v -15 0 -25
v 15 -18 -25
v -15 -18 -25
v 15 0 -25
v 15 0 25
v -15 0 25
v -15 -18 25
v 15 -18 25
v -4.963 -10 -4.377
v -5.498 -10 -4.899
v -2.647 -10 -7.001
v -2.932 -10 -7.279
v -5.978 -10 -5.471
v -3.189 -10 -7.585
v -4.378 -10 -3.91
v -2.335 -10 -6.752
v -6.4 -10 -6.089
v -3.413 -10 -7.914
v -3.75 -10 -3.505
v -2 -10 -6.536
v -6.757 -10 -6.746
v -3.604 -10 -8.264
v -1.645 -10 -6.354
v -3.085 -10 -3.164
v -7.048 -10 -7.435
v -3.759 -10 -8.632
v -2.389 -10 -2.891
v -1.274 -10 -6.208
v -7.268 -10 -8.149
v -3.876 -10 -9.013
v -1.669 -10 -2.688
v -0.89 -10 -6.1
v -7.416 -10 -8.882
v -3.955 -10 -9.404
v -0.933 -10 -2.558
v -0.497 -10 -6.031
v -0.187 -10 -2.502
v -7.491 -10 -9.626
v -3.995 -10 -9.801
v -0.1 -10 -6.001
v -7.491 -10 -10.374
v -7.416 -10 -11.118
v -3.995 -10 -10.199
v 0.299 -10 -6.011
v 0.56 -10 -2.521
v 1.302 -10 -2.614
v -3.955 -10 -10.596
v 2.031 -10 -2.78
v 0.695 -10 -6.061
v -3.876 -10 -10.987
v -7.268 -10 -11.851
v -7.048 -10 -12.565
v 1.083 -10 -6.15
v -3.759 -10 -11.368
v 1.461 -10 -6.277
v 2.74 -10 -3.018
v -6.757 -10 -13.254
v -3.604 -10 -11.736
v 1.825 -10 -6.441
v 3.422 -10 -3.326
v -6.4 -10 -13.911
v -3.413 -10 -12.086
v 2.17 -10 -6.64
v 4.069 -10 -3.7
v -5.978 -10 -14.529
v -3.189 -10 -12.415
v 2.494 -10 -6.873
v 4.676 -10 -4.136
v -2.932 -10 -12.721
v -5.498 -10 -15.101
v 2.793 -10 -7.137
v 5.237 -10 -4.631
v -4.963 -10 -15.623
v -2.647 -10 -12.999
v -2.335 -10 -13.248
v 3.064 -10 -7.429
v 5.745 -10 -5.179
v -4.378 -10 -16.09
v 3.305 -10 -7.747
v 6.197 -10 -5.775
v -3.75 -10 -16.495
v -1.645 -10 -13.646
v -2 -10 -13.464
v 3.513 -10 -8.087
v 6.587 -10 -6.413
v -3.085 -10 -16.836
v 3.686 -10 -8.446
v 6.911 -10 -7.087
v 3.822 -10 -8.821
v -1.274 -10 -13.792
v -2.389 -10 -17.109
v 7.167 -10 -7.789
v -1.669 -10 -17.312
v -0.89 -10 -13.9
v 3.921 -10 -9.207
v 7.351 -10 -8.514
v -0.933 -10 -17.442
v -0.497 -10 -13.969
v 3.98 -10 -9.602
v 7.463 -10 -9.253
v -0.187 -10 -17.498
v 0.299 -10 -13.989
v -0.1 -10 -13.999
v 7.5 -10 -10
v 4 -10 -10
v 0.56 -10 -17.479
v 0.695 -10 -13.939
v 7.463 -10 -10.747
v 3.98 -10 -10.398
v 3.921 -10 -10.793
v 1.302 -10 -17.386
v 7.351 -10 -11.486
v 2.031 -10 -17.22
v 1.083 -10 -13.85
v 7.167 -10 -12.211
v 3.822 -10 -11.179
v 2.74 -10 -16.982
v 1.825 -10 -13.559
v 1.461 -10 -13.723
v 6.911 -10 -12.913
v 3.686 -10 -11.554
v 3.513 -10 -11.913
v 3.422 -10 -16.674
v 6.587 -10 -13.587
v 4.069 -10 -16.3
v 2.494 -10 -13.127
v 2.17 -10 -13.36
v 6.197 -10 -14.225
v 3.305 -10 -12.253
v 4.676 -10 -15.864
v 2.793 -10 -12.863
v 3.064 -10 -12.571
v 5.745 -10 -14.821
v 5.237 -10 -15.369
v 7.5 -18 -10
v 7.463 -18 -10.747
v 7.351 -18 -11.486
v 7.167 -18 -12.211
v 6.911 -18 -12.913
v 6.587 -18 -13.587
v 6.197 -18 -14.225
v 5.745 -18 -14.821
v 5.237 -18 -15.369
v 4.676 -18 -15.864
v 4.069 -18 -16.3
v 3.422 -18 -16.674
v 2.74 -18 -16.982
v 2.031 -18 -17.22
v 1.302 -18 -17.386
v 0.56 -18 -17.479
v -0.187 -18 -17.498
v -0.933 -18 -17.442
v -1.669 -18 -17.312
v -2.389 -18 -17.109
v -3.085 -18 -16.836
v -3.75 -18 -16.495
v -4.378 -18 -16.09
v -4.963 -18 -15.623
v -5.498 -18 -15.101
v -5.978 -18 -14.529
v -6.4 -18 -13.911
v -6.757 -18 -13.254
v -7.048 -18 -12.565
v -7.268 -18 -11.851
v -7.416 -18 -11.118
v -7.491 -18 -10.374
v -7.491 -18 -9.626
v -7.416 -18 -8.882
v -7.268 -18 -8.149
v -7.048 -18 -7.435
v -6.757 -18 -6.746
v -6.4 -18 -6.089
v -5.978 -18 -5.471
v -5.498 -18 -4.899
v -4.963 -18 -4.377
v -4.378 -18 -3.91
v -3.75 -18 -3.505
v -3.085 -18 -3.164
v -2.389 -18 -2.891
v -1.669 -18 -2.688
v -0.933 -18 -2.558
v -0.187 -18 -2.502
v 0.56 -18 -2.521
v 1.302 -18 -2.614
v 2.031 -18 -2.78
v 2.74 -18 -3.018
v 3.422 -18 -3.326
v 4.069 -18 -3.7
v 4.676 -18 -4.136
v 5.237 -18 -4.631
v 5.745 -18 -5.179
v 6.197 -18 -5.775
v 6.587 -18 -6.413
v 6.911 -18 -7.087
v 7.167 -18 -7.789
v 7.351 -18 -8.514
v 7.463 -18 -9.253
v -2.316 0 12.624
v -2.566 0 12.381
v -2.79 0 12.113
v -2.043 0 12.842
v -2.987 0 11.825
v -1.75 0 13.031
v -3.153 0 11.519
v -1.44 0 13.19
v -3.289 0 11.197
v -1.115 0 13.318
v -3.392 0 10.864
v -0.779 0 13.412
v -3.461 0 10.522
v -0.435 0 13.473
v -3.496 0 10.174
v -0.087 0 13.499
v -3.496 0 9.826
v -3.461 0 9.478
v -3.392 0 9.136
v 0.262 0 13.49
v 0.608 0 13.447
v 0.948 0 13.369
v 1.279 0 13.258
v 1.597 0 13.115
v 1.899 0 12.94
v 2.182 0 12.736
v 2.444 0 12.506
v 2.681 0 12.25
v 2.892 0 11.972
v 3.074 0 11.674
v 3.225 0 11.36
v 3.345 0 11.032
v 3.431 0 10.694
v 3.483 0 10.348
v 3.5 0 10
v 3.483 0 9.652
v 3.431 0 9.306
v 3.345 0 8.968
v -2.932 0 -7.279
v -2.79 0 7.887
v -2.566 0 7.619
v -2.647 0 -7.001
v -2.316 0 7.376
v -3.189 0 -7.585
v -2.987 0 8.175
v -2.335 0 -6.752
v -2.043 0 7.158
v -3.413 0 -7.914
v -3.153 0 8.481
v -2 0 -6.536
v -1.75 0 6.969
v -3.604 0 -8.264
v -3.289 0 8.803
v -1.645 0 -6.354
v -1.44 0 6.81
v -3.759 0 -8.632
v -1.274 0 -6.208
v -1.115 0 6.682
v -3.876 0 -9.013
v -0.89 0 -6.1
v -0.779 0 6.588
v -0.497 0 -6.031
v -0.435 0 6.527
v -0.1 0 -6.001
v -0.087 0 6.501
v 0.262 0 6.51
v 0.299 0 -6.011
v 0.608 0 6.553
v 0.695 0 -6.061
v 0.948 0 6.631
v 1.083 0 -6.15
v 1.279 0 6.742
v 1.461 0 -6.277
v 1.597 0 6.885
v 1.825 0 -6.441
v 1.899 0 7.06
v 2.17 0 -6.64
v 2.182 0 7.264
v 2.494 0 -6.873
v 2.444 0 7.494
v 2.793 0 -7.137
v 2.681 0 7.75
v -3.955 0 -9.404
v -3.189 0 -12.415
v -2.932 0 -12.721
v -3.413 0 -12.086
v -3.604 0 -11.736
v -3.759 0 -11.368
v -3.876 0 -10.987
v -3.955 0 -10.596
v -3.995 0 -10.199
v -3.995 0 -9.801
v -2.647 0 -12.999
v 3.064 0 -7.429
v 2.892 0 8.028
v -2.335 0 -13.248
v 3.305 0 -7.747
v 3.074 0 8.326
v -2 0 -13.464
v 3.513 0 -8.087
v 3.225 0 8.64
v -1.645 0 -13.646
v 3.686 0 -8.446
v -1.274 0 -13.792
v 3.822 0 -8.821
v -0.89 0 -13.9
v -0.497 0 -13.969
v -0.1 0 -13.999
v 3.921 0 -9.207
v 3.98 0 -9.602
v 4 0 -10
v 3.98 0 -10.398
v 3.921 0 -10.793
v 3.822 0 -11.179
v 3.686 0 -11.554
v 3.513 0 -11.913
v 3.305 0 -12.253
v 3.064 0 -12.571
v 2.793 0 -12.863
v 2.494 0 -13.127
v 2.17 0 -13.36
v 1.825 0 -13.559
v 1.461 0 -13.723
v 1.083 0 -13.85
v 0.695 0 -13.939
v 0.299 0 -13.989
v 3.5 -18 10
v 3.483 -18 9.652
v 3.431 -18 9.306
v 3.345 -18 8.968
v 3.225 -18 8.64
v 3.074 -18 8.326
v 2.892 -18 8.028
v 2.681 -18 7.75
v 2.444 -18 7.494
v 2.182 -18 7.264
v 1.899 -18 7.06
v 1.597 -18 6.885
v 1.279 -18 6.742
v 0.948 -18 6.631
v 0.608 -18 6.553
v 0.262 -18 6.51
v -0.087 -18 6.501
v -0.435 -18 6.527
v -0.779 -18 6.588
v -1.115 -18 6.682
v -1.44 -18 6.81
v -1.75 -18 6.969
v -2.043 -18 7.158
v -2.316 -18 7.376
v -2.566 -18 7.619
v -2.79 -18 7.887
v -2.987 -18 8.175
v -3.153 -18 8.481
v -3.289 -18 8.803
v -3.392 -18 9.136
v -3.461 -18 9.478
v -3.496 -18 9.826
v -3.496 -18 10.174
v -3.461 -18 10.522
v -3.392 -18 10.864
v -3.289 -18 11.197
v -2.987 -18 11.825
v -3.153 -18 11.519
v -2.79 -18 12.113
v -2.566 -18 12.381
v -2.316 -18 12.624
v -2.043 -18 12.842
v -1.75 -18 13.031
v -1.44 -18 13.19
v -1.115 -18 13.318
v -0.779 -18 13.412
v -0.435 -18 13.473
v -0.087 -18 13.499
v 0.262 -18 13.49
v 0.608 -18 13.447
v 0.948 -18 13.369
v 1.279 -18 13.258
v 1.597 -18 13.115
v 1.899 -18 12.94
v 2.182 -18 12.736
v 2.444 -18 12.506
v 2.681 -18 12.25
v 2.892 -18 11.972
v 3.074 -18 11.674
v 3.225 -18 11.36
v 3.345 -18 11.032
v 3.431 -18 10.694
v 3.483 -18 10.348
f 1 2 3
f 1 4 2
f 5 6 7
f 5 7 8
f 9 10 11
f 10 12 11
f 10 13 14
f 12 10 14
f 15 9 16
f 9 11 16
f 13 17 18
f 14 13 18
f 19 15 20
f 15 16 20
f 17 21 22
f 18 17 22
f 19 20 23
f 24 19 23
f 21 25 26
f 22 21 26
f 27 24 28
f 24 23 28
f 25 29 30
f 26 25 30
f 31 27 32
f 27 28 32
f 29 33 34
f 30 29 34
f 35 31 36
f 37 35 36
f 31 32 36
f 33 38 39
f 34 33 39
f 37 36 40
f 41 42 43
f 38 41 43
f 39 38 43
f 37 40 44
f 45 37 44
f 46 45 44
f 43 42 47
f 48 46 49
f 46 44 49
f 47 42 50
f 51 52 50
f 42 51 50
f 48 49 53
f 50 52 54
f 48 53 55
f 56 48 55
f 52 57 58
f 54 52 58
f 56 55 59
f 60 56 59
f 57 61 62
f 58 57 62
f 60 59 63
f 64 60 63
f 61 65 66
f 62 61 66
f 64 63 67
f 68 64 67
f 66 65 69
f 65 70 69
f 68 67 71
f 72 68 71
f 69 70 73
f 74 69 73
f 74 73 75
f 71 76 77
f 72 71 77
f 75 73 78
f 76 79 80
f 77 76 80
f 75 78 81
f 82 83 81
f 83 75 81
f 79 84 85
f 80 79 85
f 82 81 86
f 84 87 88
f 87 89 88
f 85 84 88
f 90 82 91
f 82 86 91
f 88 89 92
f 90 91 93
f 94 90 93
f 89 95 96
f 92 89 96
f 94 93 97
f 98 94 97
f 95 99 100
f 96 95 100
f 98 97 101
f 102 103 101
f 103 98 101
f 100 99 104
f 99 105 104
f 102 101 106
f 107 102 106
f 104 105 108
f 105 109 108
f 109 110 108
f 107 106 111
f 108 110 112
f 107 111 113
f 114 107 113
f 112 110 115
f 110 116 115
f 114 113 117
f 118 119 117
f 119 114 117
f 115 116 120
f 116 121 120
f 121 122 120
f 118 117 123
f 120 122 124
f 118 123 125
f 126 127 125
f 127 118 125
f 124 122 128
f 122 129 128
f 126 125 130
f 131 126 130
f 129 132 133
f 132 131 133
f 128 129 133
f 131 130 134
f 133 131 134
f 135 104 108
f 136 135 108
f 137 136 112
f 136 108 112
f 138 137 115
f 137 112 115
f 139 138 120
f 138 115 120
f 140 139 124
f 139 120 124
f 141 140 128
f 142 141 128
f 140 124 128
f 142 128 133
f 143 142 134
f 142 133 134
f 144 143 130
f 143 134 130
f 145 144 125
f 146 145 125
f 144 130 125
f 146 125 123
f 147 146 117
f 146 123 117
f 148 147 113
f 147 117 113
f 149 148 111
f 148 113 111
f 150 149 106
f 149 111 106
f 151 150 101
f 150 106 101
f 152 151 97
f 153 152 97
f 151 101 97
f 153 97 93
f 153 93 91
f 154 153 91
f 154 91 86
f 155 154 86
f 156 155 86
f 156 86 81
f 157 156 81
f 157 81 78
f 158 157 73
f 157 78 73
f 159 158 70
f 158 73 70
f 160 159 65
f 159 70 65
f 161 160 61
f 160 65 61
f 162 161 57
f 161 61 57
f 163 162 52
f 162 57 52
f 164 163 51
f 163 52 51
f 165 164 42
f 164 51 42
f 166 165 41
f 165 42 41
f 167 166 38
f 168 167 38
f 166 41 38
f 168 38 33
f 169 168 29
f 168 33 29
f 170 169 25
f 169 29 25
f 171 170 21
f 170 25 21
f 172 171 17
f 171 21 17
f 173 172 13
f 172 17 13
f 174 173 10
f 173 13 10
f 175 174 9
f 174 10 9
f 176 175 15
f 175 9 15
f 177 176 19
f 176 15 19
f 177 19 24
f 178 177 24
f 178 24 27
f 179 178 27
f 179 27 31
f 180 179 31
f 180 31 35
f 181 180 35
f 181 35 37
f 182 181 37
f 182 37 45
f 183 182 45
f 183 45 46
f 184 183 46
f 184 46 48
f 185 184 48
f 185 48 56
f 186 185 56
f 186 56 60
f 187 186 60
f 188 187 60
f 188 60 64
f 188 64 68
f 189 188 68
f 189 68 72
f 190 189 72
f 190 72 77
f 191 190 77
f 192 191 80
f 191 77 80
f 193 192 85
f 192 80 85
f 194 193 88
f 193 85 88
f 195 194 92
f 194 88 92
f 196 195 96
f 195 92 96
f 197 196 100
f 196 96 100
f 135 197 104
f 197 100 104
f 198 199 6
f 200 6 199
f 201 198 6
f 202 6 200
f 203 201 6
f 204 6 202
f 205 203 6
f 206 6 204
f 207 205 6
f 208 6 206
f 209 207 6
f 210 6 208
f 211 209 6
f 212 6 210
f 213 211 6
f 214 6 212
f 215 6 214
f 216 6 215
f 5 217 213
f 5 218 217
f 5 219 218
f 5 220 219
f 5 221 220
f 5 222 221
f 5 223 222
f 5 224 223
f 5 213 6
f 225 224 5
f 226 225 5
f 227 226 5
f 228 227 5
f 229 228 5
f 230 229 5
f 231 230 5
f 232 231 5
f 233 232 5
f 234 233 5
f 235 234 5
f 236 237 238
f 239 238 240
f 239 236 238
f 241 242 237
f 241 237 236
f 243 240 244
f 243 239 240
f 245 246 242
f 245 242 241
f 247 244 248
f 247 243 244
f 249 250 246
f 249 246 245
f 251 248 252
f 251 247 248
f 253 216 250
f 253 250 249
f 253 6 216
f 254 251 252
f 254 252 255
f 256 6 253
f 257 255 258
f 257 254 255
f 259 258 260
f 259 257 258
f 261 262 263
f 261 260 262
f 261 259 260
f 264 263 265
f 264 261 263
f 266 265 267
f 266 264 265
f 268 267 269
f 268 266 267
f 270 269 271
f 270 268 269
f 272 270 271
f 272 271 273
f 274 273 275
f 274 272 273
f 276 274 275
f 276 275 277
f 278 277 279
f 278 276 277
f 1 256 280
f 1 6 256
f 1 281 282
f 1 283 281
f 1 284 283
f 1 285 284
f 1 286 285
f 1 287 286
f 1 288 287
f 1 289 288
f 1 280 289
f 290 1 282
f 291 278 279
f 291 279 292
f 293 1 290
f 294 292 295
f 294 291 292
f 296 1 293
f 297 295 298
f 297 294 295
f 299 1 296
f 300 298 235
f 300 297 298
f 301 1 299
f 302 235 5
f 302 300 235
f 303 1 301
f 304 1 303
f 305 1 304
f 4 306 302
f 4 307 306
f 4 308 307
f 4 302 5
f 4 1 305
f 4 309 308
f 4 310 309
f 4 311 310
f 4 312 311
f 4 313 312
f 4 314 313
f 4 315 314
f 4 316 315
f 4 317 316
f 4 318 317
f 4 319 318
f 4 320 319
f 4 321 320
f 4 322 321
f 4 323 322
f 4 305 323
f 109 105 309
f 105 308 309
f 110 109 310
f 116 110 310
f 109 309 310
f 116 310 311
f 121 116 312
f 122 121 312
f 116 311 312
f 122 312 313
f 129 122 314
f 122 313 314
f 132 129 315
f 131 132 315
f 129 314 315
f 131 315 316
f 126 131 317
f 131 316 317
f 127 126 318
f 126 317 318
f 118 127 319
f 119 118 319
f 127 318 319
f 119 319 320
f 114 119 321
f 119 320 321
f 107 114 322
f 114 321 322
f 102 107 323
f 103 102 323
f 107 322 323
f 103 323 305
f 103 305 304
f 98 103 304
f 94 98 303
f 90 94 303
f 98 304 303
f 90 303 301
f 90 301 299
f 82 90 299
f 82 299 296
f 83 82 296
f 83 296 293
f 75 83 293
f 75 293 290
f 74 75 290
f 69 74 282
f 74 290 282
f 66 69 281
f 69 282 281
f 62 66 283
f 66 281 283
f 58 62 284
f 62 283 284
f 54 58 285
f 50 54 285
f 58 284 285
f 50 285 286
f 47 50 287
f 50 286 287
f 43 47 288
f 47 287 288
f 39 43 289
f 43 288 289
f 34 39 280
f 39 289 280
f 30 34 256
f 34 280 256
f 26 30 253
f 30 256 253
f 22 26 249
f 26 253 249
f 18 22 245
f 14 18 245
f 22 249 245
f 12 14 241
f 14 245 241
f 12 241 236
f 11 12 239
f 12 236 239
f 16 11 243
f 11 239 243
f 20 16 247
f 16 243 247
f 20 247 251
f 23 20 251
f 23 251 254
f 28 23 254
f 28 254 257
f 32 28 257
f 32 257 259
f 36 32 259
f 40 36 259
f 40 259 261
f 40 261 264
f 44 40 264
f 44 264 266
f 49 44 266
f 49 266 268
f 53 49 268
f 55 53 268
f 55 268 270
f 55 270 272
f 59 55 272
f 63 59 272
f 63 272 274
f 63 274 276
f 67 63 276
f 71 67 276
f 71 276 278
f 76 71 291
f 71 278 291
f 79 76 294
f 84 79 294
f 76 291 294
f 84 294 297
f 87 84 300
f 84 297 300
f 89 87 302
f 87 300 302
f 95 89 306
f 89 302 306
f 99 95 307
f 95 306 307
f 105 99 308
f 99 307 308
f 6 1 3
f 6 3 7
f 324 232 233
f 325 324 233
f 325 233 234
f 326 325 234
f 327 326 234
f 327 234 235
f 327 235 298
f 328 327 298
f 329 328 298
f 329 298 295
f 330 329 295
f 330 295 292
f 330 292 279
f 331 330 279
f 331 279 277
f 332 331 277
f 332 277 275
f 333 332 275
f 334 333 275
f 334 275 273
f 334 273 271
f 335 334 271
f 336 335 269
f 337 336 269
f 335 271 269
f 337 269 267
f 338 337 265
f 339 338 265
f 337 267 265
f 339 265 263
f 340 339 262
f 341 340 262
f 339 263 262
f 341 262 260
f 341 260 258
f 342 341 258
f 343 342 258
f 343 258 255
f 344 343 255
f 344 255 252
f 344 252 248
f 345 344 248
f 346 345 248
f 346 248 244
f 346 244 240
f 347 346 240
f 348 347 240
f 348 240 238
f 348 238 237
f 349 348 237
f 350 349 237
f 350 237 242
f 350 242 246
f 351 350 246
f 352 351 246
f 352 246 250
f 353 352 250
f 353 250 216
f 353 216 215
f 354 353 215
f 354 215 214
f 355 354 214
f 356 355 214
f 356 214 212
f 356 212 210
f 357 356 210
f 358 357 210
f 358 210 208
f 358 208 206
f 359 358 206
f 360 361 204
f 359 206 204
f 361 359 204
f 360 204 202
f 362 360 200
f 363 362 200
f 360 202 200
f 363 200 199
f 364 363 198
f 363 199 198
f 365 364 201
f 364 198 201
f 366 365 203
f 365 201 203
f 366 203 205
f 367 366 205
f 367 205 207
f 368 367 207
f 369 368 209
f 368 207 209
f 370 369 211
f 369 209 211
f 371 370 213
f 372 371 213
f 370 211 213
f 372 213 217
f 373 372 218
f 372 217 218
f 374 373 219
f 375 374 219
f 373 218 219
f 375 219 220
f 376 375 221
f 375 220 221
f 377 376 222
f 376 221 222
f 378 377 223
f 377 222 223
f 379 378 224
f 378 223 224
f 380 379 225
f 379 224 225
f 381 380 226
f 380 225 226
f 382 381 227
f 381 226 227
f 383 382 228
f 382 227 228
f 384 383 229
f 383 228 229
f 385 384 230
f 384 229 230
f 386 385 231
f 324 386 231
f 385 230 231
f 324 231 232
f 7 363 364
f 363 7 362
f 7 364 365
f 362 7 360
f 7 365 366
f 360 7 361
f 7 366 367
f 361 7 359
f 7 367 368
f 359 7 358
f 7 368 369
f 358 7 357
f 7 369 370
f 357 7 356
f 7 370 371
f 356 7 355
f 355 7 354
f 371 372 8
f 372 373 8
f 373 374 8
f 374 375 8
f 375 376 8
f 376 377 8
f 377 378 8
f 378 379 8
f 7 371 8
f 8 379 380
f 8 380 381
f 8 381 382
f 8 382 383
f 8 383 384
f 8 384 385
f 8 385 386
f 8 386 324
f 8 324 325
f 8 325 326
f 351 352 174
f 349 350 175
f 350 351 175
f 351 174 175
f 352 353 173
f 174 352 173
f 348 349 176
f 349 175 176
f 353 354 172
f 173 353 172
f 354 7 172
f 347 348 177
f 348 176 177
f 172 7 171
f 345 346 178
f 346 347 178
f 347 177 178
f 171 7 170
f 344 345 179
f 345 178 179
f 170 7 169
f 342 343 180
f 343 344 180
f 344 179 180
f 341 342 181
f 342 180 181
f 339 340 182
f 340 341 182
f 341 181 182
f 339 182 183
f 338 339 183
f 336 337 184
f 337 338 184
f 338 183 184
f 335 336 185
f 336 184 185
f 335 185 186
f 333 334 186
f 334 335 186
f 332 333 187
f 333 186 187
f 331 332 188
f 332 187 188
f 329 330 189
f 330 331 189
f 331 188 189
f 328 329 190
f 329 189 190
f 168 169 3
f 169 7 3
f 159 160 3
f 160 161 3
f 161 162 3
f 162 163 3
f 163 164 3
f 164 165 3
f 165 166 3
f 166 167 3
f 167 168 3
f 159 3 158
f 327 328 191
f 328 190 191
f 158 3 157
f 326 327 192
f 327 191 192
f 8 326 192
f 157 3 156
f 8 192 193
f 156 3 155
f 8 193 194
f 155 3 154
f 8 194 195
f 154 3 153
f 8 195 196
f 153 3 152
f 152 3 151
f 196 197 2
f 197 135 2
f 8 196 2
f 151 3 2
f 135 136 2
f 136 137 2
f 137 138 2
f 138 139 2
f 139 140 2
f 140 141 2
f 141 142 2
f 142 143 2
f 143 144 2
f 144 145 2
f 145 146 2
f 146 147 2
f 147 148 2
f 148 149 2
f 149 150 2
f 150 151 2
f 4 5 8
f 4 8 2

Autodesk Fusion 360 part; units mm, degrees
sketch "Front" plane through (0, 0, 0) normal (0, 1, 0) x (1, 0, 0)
  line L0 (-15, -25) -> (15, -25)
  line L1 (15, -25) -> (15, 25)
  line L2 (15, 25) -> (-15, 25)
  line L3 (-15, 25) -> (-15, -25)
  line L4 (0, -25) -> (0, 25) construction
  circle A0 centre (0, 10) radius 4
  circle A1 centre (0, -10) radius 3.5
  circle A2 centre (0, 10) radius 7.5
  dimension "d11" = 30
  dimension "d12" = 50
  dimension "d19" = 8
  dimension "d20" = 7
  dimension "d21" = 20
  dimension "d24" = 15
  dimension "d26" = 15
extrude "Extrude3" add sketch "Front" against normal blind 10 contours A2
extrude "Extrude4" add sketch "Front" against normal blind 18 contours L0 L1 L2 L3
